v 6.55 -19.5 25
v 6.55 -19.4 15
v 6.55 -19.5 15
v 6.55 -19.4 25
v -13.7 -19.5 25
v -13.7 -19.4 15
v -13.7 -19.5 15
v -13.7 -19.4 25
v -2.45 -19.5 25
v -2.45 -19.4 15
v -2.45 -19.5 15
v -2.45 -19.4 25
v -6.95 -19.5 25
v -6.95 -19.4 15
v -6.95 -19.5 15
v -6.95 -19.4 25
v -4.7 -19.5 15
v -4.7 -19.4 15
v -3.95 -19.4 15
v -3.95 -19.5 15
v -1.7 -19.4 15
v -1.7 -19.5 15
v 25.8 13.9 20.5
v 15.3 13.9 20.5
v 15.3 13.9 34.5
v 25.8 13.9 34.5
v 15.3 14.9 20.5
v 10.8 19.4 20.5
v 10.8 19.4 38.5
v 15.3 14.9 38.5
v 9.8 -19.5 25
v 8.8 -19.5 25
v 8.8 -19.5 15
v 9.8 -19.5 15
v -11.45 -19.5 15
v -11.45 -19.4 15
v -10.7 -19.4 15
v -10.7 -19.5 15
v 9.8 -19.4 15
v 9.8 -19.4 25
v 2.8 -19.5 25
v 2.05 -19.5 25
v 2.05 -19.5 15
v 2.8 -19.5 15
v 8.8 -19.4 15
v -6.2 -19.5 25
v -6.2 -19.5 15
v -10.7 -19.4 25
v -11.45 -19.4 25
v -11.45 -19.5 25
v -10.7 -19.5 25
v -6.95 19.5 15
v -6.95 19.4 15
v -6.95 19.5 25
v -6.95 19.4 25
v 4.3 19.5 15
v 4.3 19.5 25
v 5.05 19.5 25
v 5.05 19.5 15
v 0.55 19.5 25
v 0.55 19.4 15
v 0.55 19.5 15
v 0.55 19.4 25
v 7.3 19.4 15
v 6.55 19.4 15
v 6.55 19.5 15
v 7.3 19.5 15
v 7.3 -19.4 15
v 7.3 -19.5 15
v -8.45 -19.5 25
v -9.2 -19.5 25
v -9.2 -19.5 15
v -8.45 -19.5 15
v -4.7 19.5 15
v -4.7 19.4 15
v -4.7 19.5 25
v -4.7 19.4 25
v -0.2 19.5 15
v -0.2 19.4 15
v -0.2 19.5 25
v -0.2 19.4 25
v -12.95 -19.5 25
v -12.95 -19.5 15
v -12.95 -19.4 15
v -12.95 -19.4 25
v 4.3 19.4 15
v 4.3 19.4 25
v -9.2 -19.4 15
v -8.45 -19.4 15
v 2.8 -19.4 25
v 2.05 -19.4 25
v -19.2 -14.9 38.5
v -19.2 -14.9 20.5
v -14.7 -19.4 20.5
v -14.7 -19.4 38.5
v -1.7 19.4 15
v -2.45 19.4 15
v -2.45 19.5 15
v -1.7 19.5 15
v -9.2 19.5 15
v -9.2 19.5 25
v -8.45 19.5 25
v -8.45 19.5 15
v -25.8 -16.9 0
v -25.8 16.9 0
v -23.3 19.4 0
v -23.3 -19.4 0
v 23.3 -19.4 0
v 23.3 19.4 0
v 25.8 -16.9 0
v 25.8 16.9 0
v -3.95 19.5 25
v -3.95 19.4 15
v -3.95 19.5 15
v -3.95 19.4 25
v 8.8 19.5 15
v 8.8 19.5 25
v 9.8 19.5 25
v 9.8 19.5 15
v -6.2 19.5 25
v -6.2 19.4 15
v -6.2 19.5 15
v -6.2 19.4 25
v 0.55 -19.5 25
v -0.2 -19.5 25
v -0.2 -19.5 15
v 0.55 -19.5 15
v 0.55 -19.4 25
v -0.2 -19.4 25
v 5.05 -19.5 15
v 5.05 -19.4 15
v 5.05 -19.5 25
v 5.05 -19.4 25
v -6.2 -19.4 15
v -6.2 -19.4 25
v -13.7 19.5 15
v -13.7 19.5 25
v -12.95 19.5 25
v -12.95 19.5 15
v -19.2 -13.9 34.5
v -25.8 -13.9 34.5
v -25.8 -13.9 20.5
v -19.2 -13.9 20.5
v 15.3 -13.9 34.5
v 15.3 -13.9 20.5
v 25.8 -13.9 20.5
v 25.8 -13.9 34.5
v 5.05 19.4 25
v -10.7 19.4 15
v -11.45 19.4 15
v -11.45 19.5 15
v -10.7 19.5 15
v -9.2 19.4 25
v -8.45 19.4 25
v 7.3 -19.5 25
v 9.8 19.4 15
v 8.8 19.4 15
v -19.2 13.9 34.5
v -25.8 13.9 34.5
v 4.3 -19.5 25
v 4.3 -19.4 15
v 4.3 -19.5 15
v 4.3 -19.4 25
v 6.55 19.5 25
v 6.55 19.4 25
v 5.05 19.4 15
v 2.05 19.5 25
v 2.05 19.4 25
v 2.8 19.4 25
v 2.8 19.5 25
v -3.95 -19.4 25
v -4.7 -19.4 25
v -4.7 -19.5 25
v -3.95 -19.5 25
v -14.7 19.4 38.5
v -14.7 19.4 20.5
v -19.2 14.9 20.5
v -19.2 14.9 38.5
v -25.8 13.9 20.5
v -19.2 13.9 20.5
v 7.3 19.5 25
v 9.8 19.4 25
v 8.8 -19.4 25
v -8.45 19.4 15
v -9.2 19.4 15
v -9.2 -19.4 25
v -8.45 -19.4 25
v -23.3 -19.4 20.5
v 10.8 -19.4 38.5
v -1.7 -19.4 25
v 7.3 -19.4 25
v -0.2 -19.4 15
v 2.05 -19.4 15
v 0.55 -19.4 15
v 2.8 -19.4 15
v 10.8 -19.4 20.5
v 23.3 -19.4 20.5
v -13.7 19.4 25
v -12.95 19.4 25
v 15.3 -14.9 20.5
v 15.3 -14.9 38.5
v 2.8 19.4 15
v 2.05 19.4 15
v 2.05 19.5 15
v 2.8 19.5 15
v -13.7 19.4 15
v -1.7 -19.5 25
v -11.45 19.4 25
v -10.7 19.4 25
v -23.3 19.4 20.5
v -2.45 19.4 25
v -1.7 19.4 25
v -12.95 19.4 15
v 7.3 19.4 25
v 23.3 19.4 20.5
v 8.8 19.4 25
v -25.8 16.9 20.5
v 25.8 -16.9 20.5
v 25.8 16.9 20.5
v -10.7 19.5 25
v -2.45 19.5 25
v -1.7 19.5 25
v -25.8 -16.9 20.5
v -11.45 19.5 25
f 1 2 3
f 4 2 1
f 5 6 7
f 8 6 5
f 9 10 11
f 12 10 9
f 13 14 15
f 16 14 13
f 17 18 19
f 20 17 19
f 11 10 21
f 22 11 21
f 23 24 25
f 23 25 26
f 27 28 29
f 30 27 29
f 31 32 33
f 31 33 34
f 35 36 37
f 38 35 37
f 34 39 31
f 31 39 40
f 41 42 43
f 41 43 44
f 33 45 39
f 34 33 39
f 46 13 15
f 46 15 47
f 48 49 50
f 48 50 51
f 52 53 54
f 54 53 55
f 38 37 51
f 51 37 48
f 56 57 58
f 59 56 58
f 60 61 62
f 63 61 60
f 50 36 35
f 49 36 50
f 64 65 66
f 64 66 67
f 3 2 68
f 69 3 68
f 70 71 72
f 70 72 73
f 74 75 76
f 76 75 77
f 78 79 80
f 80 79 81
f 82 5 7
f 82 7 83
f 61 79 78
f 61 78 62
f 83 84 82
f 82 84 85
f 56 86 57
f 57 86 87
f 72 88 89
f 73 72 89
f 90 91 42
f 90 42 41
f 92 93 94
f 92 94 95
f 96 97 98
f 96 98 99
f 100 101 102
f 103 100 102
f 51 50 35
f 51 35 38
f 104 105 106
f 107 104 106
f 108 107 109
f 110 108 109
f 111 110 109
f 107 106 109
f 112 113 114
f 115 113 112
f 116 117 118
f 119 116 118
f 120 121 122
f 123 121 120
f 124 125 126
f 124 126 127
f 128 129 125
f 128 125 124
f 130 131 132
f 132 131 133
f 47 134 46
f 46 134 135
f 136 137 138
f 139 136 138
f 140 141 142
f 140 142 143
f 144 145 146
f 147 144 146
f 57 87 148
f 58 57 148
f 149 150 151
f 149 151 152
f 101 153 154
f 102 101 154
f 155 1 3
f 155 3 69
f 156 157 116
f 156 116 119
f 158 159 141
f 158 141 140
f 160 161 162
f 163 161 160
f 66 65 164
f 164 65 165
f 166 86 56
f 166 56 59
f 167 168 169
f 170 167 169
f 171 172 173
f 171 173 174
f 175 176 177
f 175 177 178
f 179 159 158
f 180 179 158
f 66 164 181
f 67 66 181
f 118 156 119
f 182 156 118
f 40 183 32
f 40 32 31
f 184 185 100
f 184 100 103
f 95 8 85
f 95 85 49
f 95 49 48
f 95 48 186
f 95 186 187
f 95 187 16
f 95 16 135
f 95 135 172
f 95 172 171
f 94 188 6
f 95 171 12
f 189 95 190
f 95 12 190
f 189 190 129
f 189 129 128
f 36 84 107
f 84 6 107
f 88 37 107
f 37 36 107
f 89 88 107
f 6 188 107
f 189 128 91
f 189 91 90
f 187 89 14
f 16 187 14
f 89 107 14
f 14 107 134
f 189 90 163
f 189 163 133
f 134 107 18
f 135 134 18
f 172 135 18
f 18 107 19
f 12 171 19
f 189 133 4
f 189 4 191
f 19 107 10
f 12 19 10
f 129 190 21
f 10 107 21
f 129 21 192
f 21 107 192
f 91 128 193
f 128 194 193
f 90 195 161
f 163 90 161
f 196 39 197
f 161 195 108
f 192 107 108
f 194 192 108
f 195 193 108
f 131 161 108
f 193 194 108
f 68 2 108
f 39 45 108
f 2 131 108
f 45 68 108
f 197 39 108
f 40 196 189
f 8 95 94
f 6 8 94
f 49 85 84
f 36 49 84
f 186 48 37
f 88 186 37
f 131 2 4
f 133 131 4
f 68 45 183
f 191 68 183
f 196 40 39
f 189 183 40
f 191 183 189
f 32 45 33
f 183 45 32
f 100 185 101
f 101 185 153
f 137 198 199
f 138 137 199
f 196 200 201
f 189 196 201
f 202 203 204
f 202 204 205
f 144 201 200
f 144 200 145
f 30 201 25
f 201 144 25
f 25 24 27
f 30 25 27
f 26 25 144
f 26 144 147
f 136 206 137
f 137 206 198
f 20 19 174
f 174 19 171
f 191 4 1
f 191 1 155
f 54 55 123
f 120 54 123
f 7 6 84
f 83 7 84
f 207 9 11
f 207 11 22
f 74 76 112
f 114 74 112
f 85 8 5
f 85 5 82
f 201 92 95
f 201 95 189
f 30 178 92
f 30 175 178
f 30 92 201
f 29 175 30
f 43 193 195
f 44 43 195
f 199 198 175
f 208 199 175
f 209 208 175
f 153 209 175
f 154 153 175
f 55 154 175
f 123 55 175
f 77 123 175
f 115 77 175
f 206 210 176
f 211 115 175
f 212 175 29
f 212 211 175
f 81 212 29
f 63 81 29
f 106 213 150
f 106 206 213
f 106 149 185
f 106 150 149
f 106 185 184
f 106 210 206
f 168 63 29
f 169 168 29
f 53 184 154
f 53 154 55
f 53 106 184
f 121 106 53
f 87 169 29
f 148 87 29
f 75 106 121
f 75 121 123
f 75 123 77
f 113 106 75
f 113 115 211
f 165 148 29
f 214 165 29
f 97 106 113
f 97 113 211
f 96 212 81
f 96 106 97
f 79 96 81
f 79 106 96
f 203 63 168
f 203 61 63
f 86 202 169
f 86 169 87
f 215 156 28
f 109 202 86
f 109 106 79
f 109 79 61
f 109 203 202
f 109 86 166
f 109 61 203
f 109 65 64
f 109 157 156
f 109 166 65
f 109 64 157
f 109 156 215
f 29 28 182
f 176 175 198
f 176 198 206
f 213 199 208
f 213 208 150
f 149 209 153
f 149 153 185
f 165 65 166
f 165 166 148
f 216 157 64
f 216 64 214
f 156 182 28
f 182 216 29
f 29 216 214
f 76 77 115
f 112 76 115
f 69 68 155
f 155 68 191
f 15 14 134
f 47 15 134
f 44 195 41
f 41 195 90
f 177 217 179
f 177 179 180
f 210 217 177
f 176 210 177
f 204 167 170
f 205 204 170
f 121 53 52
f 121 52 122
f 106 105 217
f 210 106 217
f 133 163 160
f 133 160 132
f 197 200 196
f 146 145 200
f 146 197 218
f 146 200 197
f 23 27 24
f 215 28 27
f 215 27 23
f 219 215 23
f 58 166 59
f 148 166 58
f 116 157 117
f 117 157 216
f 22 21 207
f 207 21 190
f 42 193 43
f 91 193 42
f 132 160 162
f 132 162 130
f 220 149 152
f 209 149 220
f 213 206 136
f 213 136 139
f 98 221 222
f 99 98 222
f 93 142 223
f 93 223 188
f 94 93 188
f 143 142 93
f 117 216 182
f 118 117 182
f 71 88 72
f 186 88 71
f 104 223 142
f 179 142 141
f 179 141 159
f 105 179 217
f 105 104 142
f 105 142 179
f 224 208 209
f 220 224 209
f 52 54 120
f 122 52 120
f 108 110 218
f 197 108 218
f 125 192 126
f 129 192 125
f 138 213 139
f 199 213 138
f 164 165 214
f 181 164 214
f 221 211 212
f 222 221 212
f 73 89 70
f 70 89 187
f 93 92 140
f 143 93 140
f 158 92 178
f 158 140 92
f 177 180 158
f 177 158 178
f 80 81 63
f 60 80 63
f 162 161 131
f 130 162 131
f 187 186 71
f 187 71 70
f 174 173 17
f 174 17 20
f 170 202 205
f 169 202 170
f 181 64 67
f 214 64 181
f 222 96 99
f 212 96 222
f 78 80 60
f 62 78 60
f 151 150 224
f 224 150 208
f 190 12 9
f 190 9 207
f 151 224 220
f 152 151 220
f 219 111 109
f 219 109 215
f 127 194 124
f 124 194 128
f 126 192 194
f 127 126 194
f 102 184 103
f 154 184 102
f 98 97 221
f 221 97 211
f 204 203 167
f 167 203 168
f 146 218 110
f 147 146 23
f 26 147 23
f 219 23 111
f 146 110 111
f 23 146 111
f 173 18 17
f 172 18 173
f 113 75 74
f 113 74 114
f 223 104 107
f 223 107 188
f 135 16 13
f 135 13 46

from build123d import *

# Parameters (mm, degrees)
SKETCH1_W           = 51.6
SKETCH1_H           = 38.8
BOSS_EXTRUDE1_DEPTH = 20.5
SKETCH2_W           = 51.6
SKETCH2_H           = 27.8
BOSS_EXTRUDE2_DEPTH = 14
SKETCH3_W           = 34.5
SKETCH3_H           = 38.8
BOSS_EXTRUDE3_DEPTH = 18
SKETCH4_W           = 0.75
SKETCH4_H           = 10
SKETCH4_W_2         = 1
BOSS_EXTRUDE4_DEPTH = 0.1
CHAMFER1_SIZE       = 2.5
CHAMFER2_SIZE       = 4.5


with BuildPart() as part:
    # Sketch1 → Boss-Extrude1 (new body)
    with BuildSketch(Plane.XY):
        Rectangle(SKETCH1_W, SKETCH1_H)
    extrude(amount=BOSS_EXTRUDE1_DEPTH)

    # Sketch2 → Boss-Extrude2 (add)
    with BuildSketch(Plane.XY.offset(20.5)):
        Rectangle(SKETCH2_W, SKETCH2_H)
    extrude(amount=BOSS_EXTRUDE2_DEPTH)

    # Sketch3 → Boss-Extrude3 (add)
    with BuildSketch(Plane.XY.offset(20.5)):
        with Locations((-1.95, 0)):
            Rectangle(SKETCH3_W, SKETCH3_H)
    extrude(amount=BOSS_EXTRUDE3_DEPTH)

    # Sketch4 → Boss-Extrude4 (add)
    with BuildSketch(Plane.XZ.offset(19.4)):
        with Locations((-13.325, 20)):
            Rectangle(SKETCH4_W, SKETCH4_H)
        with Locations((-11.075, 20)):
            Rectangle(SKETCH4_W, SKETCH4_H)
        with Locations((-8.825, 20)):
            Rectangle(SKETCH4_W, SKETCH4_H)
        with Locations((-6.575, 20)):
            Rectangle(SKETCH4_W, SKETCH4_H)
        with Locations((-4.325, 20)):
            Rectangle(SKETCH4_W, SKETCH4_H)
        with Locations((-2.075, 20)):
            Rectangle(SKETCH4_W, SKETCH4_H)
        with Locations((0.175, 20)):
            Rectangle(SKETCH4_W, SKETCH4_H)
        with Locations((2.425, 20)):
            Rectangle(SKETCH4_W, SKETCH4_H)
        with Locations((4.675, 20)):
            Rectangle(SKETCH4_W, SKETCH4_H)
        with Locations((6.925, 20)):
            Rectangle(SKETCH4_W, SKETCH4_H)
        with Locations((9.3, 20)):
            Rectangle(SKETCH4_W_2, SKETCH4_H)
    boss_extrude4 = extrude(amount=BOSS_EXTRUDE4_DEPTH)

    # Mirror1: Boss-Extrude4 across plane
    add(boss_extrude4.mirror(Plane.ZX))

    # Chamfer1
    chamfer1_edges = [part.edges().sort_by_distance(p)[0] for p in [
        (25.8, -19.4, 10.25),
        (-25.8, 19.4, 10.25),
        (-25.8, -19.4, 10.25),
        (25.8, 19.4, 10.25),
    ]]
    chamfer(chamfer1_edges, length=CHAMFER1_SIZE)

    # Chamfer2
    chamfer2_edges = [part.edges().sort_by_distance(p)[0] for p in [
        (-19.2, -19.4, 29.5),
        (15.3, -19.4, 29.5),
        (-19.2, 19.4, 29.5),
        (15.3, 19.4, 29.5),
    ]]
    chamfer(chamfer2_edges, length=CHAMFER2_SIZE)


solid = part.part
